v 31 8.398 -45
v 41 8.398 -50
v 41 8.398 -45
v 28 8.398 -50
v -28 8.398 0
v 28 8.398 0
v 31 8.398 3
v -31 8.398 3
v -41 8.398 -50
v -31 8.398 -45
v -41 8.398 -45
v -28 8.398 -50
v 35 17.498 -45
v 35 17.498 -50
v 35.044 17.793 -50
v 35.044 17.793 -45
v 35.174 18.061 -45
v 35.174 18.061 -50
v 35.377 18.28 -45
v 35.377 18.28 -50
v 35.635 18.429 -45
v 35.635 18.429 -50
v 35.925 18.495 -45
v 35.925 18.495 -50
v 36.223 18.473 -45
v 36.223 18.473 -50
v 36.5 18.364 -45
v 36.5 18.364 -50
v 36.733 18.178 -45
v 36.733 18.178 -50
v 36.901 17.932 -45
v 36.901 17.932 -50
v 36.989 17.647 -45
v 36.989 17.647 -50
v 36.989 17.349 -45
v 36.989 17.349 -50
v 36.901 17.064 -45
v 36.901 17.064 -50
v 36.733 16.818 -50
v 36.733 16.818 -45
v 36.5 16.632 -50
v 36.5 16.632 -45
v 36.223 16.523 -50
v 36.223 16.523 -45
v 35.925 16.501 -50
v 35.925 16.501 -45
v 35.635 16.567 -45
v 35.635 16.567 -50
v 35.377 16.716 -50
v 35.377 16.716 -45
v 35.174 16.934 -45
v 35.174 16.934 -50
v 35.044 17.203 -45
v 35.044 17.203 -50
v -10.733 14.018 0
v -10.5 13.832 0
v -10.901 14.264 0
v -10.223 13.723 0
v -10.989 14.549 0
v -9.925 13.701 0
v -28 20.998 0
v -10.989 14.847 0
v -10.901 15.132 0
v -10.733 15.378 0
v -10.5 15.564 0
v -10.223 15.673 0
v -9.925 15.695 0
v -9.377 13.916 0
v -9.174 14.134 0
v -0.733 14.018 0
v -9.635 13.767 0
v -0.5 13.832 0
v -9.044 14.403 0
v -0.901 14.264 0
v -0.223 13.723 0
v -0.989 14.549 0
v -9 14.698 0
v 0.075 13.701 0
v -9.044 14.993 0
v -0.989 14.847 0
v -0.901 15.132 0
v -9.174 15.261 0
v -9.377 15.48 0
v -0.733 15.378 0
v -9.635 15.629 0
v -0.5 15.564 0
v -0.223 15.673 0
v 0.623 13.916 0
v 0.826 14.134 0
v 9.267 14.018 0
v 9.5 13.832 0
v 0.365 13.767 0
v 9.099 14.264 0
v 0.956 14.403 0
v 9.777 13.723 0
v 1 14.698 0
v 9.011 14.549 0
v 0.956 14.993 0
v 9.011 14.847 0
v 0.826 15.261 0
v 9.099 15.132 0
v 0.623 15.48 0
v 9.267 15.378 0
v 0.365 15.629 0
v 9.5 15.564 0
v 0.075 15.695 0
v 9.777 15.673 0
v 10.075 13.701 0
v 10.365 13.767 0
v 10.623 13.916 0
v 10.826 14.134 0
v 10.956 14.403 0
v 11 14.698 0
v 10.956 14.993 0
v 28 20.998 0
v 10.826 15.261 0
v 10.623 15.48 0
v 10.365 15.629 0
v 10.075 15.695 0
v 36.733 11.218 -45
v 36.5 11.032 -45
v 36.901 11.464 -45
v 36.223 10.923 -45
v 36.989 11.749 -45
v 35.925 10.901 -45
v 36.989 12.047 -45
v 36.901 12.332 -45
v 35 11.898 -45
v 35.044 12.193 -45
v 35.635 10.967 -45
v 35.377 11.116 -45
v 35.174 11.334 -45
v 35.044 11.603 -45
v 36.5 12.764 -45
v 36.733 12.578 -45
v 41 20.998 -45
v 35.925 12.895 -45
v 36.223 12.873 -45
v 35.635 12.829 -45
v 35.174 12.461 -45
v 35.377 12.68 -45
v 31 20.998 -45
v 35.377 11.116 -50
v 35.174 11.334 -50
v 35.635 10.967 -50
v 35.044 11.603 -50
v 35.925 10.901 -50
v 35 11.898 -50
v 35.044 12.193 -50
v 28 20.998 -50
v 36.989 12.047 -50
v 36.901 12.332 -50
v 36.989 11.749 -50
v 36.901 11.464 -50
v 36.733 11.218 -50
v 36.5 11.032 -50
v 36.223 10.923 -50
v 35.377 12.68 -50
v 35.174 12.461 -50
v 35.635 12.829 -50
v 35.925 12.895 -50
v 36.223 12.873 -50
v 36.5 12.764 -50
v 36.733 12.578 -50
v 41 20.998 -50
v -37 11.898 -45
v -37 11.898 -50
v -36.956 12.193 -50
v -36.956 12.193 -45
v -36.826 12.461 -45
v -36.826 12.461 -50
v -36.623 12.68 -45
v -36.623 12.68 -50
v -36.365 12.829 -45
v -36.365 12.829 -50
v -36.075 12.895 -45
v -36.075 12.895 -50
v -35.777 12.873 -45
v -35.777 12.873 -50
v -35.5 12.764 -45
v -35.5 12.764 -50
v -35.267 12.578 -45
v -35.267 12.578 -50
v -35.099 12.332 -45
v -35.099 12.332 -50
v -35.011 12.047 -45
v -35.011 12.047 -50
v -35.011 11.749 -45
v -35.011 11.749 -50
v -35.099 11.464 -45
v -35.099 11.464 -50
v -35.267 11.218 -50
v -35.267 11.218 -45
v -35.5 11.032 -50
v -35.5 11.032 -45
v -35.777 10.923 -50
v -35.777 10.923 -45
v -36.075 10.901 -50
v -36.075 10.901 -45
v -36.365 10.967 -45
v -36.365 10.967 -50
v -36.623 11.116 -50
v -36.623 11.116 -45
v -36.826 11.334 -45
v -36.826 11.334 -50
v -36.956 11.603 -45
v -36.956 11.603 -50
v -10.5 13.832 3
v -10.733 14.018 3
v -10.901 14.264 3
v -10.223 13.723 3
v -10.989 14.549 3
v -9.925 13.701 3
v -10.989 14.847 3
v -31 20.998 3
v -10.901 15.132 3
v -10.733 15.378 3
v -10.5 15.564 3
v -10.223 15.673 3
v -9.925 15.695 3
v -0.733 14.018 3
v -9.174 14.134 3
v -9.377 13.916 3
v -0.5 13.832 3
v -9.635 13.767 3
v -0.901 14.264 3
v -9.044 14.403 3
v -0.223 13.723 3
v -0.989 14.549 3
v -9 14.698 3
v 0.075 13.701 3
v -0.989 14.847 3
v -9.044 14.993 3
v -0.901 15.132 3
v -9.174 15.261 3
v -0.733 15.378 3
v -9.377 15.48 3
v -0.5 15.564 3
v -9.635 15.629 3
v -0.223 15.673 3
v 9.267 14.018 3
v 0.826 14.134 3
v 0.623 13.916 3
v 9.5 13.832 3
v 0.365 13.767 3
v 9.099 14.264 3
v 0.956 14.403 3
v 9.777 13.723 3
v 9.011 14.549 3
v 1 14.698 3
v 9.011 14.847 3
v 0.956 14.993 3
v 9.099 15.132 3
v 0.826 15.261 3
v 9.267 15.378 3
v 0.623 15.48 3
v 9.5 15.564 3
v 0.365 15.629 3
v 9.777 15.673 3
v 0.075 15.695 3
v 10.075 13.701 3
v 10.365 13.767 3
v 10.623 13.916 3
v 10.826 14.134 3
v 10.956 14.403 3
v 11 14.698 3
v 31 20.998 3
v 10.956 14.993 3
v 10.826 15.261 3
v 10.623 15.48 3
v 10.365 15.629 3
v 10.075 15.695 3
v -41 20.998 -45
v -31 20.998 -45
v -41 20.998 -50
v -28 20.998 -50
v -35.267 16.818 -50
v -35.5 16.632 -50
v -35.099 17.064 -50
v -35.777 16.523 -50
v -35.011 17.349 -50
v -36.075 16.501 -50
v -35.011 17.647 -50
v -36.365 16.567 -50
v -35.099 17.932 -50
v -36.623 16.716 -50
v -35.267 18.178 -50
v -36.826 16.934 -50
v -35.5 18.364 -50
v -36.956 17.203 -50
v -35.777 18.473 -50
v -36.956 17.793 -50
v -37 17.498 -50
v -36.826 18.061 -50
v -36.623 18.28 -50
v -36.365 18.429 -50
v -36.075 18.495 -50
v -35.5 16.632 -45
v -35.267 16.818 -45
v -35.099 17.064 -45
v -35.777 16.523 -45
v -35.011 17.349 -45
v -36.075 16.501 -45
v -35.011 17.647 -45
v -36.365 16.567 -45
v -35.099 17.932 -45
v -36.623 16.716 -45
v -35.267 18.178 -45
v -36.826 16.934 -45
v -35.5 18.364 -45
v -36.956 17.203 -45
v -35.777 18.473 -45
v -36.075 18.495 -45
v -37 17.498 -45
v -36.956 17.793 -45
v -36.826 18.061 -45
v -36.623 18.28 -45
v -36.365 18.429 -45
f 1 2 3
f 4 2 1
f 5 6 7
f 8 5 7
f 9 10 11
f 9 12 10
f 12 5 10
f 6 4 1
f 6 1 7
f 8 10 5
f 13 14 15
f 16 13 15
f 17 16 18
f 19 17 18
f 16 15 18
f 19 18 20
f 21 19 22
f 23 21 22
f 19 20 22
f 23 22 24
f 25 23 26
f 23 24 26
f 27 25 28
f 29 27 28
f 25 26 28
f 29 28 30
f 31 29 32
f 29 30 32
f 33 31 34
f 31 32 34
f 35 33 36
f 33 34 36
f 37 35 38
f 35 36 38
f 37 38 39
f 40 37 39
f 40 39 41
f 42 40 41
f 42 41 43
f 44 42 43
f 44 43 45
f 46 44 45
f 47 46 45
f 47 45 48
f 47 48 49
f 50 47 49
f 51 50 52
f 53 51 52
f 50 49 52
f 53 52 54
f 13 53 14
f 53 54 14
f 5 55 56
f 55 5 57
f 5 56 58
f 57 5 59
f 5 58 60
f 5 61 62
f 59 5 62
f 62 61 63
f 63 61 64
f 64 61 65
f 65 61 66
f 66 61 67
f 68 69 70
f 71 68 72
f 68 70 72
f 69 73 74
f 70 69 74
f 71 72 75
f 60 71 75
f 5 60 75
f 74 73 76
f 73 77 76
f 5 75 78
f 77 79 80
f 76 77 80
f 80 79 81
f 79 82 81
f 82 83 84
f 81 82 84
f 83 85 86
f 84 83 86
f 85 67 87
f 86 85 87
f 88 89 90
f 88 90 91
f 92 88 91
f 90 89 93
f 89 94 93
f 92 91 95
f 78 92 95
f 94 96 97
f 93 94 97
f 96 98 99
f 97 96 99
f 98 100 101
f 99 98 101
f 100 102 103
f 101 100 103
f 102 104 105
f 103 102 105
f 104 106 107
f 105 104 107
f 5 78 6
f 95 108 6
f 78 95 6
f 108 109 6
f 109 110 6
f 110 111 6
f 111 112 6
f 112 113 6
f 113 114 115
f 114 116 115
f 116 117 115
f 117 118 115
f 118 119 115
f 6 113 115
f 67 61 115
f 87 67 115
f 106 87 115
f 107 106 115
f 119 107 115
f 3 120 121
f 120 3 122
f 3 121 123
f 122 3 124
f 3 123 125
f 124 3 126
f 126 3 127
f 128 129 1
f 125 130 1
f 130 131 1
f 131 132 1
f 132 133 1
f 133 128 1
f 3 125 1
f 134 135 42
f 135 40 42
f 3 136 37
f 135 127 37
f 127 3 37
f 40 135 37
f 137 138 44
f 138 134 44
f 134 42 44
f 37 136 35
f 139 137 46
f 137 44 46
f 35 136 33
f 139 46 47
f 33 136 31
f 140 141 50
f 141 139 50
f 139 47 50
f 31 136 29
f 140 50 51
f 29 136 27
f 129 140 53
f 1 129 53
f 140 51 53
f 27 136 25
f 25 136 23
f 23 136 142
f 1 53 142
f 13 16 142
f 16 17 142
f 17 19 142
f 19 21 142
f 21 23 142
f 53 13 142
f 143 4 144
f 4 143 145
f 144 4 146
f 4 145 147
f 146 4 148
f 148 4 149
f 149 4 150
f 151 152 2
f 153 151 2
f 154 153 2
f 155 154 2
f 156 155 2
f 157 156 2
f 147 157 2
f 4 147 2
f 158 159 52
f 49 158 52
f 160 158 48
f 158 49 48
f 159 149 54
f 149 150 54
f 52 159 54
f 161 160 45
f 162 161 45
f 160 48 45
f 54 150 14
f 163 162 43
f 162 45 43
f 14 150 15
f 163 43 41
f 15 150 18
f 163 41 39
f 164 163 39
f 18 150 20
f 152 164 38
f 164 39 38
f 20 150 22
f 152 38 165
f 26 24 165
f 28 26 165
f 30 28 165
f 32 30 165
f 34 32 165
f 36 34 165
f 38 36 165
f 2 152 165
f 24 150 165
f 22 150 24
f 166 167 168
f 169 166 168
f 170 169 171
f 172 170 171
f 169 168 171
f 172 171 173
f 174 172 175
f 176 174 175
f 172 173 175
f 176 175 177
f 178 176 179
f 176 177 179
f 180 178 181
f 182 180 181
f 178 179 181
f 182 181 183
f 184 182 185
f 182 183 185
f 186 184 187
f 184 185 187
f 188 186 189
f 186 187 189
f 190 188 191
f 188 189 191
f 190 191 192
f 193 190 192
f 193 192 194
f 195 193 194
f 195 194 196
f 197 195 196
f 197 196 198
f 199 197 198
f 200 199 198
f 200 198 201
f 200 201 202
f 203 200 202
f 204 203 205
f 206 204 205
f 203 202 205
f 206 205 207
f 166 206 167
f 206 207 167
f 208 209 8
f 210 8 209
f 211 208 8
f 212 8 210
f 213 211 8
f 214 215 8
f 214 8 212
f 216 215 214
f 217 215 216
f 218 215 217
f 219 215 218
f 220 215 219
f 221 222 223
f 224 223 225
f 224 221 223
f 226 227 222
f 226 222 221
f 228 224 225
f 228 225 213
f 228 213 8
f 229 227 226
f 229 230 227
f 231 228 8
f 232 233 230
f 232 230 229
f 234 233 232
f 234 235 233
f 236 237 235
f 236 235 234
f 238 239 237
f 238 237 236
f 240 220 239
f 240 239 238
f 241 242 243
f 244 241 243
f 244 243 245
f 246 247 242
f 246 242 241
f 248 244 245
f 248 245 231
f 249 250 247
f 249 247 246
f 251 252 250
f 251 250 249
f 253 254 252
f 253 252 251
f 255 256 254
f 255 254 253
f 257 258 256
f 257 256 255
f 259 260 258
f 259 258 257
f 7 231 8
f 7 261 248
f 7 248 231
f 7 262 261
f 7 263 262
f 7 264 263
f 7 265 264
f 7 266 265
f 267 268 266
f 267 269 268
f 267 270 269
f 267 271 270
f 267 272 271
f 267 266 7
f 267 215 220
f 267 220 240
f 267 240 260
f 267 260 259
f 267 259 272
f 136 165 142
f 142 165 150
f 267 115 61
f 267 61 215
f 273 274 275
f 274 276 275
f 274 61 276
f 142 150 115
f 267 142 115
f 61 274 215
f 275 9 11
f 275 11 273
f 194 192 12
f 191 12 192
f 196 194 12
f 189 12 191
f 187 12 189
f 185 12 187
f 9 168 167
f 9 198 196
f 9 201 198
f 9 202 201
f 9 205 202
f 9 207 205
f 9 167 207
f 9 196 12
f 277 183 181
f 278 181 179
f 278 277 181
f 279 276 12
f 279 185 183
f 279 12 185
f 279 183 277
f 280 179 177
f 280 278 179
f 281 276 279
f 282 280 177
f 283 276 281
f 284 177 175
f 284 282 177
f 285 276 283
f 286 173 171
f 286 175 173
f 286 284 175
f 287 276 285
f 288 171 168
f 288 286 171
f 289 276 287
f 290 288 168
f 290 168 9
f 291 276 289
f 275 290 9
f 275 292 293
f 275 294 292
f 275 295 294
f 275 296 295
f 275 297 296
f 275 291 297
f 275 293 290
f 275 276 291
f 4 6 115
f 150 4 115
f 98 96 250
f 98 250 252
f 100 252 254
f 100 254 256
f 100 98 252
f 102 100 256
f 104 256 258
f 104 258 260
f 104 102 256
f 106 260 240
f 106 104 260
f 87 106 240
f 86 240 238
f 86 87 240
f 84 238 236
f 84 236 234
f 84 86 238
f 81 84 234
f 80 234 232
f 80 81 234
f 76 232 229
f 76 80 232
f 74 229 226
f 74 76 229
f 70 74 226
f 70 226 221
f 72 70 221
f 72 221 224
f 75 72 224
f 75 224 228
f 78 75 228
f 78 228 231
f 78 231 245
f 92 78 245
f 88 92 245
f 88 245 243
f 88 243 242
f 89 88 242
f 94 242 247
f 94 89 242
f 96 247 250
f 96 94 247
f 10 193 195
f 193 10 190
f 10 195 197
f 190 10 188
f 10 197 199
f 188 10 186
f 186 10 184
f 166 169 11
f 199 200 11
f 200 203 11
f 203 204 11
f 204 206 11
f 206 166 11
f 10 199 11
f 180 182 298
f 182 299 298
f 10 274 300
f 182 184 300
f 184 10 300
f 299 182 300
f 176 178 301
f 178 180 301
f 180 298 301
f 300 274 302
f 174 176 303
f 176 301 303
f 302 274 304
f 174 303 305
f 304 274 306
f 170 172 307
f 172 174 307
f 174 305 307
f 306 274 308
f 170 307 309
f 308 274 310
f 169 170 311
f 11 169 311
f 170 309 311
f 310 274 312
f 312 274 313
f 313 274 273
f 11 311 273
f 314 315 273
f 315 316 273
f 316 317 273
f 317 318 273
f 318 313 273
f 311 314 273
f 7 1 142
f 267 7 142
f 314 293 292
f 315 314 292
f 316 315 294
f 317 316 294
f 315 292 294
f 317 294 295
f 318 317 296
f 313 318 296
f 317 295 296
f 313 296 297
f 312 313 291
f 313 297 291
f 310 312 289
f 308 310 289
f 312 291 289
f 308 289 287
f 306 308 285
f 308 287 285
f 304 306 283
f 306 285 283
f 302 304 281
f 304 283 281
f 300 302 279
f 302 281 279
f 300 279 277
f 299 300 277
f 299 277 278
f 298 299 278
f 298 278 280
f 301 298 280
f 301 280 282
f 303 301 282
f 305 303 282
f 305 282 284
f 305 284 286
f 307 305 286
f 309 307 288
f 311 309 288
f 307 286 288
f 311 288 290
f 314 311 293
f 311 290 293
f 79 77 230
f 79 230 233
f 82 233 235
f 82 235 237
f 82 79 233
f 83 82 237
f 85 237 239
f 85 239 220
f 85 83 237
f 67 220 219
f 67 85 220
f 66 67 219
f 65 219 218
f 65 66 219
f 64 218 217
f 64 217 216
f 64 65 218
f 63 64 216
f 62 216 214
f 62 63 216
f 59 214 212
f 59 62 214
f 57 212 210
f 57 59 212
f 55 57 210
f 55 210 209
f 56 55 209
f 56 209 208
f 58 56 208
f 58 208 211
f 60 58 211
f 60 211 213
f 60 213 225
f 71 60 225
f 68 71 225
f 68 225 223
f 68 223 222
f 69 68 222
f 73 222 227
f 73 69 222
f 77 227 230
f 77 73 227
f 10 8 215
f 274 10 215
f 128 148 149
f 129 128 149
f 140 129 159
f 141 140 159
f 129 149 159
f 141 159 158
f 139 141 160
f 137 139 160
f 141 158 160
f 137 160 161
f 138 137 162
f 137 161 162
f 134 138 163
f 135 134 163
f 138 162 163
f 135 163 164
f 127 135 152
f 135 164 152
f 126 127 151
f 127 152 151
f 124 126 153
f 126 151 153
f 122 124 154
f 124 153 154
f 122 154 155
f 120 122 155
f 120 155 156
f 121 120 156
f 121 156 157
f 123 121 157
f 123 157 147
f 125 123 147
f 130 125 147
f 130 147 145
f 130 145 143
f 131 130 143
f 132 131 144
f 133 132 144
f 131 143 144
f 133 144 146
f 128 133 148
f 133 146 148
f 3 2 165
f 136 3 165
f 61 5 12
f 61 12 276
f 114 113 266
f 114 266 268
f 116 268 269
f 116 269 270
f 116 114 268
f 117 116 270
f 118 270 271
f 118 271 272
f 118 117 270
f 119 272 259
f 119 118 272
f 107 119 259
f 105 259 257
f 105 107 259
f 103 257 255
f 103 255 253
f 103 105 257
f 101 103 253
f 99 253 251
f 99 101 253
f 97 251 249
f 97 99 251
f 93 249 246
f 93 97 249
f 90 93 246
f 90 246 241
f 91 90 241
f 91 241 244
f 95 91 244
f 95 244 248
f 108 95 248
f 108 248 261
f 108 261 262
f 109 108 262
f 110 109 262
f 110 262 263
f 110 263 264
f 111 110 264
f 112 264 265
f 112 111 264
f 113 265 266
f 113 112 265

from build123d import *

# Parameters (mm, degrees)
SKETCH1_W           = 62
SKETCH1_H           = 12.6
SKETCH1_R           = 1
BOSS_EXTRUDE1_DEPTH = 3
SKETCH1_14_W        = 3
SKETCH1_14_H        = 12.6
BOSS_EXTRUDE2_DEPTH = 50
SKETCH6_W           = 10
SKETCH6_H           = 12.6
SKETCH6_R           = 1
BOSS_EXTRUDE5_DEPTH = 5


with BuildPart() as part:
    # Sketch1 → Boss-Extrude1 (new body)
    with BuildSketch(Plane.XY):
        with Locations((0, 14.697780108)):
            Rectangle(SKETCH1_W, SKETCH1_H)
        with Locations((0, 14.697780108)):
            Circle(SKETCH1_R, mode=Mode.SUBTRACT)
        with Locations((10, 14.697780108)):
            Circle(SKETCH1_R, mode=Mode.SUBTRACT)
        with Locations((-10, 14.697780108)):
            Circle(SKETCH1_R, mode=Mode.SUBTRACT)
    extrude(amount=BOSS_EXTRUDE1_DEPTH)

    # Sketch1_14 → Boss-Extrude2 (add)
    with BuildSketch(Plane.XY):
        with Locations((-29.5, 14.697780108)):
            Rectangle(SKETCH1_14_W, SKETCH1_14_H)
        with Locations((29.5, 14.697780108)):
            Rectangle(SKETCH1_14_W, SKETCH1_14_H)
    extrude(amount=-BOSS_EXTRUDE2_DEPTH)

    # Sketch6 → Boss-Extrude5 (add)
    # profile 1 of 2: a face of its own
    with BuildSketch(Plane(origin=(0, 0, -50), x_dir=(-1, 0, 0), z_dir=(0, 0, -1))):
        with Locations((36, 14.697780108)):
            Rectangle(SKETCH6_W, SKETCH6_H)
        with Locations((36, 11.897780108)):
            Circle(SKETCH6_R, mode=Mode.SUBTRACT)
        with Locations((36, 17.497780108)):
            Circle(SKETCH6_R, mode=Mode.SUBTRACT)
    # profile 2 of 2: a face of its own
    with BuildSketch(Plane(origin=(0, 0, -50), x_dir=(-1, 0, 0), z_dir=(0, 0, -1))):
        with Locations((-36, 14.697780108)):
            Rectangle(SKETCH6_W, SKETCH6_H)
        with Locations((-36, 11.897780108)):
            Circle(SKETCH6_R, mode=Mode.SUBTRACT)
        with Locations((-36, 17.497780108)):
            Circle(SKETCH6_R, mode=Mode.SUBTRACT)
    extrude(amount=-BOSS_EXTRUDE5_DEPTH)


solid = part.part
